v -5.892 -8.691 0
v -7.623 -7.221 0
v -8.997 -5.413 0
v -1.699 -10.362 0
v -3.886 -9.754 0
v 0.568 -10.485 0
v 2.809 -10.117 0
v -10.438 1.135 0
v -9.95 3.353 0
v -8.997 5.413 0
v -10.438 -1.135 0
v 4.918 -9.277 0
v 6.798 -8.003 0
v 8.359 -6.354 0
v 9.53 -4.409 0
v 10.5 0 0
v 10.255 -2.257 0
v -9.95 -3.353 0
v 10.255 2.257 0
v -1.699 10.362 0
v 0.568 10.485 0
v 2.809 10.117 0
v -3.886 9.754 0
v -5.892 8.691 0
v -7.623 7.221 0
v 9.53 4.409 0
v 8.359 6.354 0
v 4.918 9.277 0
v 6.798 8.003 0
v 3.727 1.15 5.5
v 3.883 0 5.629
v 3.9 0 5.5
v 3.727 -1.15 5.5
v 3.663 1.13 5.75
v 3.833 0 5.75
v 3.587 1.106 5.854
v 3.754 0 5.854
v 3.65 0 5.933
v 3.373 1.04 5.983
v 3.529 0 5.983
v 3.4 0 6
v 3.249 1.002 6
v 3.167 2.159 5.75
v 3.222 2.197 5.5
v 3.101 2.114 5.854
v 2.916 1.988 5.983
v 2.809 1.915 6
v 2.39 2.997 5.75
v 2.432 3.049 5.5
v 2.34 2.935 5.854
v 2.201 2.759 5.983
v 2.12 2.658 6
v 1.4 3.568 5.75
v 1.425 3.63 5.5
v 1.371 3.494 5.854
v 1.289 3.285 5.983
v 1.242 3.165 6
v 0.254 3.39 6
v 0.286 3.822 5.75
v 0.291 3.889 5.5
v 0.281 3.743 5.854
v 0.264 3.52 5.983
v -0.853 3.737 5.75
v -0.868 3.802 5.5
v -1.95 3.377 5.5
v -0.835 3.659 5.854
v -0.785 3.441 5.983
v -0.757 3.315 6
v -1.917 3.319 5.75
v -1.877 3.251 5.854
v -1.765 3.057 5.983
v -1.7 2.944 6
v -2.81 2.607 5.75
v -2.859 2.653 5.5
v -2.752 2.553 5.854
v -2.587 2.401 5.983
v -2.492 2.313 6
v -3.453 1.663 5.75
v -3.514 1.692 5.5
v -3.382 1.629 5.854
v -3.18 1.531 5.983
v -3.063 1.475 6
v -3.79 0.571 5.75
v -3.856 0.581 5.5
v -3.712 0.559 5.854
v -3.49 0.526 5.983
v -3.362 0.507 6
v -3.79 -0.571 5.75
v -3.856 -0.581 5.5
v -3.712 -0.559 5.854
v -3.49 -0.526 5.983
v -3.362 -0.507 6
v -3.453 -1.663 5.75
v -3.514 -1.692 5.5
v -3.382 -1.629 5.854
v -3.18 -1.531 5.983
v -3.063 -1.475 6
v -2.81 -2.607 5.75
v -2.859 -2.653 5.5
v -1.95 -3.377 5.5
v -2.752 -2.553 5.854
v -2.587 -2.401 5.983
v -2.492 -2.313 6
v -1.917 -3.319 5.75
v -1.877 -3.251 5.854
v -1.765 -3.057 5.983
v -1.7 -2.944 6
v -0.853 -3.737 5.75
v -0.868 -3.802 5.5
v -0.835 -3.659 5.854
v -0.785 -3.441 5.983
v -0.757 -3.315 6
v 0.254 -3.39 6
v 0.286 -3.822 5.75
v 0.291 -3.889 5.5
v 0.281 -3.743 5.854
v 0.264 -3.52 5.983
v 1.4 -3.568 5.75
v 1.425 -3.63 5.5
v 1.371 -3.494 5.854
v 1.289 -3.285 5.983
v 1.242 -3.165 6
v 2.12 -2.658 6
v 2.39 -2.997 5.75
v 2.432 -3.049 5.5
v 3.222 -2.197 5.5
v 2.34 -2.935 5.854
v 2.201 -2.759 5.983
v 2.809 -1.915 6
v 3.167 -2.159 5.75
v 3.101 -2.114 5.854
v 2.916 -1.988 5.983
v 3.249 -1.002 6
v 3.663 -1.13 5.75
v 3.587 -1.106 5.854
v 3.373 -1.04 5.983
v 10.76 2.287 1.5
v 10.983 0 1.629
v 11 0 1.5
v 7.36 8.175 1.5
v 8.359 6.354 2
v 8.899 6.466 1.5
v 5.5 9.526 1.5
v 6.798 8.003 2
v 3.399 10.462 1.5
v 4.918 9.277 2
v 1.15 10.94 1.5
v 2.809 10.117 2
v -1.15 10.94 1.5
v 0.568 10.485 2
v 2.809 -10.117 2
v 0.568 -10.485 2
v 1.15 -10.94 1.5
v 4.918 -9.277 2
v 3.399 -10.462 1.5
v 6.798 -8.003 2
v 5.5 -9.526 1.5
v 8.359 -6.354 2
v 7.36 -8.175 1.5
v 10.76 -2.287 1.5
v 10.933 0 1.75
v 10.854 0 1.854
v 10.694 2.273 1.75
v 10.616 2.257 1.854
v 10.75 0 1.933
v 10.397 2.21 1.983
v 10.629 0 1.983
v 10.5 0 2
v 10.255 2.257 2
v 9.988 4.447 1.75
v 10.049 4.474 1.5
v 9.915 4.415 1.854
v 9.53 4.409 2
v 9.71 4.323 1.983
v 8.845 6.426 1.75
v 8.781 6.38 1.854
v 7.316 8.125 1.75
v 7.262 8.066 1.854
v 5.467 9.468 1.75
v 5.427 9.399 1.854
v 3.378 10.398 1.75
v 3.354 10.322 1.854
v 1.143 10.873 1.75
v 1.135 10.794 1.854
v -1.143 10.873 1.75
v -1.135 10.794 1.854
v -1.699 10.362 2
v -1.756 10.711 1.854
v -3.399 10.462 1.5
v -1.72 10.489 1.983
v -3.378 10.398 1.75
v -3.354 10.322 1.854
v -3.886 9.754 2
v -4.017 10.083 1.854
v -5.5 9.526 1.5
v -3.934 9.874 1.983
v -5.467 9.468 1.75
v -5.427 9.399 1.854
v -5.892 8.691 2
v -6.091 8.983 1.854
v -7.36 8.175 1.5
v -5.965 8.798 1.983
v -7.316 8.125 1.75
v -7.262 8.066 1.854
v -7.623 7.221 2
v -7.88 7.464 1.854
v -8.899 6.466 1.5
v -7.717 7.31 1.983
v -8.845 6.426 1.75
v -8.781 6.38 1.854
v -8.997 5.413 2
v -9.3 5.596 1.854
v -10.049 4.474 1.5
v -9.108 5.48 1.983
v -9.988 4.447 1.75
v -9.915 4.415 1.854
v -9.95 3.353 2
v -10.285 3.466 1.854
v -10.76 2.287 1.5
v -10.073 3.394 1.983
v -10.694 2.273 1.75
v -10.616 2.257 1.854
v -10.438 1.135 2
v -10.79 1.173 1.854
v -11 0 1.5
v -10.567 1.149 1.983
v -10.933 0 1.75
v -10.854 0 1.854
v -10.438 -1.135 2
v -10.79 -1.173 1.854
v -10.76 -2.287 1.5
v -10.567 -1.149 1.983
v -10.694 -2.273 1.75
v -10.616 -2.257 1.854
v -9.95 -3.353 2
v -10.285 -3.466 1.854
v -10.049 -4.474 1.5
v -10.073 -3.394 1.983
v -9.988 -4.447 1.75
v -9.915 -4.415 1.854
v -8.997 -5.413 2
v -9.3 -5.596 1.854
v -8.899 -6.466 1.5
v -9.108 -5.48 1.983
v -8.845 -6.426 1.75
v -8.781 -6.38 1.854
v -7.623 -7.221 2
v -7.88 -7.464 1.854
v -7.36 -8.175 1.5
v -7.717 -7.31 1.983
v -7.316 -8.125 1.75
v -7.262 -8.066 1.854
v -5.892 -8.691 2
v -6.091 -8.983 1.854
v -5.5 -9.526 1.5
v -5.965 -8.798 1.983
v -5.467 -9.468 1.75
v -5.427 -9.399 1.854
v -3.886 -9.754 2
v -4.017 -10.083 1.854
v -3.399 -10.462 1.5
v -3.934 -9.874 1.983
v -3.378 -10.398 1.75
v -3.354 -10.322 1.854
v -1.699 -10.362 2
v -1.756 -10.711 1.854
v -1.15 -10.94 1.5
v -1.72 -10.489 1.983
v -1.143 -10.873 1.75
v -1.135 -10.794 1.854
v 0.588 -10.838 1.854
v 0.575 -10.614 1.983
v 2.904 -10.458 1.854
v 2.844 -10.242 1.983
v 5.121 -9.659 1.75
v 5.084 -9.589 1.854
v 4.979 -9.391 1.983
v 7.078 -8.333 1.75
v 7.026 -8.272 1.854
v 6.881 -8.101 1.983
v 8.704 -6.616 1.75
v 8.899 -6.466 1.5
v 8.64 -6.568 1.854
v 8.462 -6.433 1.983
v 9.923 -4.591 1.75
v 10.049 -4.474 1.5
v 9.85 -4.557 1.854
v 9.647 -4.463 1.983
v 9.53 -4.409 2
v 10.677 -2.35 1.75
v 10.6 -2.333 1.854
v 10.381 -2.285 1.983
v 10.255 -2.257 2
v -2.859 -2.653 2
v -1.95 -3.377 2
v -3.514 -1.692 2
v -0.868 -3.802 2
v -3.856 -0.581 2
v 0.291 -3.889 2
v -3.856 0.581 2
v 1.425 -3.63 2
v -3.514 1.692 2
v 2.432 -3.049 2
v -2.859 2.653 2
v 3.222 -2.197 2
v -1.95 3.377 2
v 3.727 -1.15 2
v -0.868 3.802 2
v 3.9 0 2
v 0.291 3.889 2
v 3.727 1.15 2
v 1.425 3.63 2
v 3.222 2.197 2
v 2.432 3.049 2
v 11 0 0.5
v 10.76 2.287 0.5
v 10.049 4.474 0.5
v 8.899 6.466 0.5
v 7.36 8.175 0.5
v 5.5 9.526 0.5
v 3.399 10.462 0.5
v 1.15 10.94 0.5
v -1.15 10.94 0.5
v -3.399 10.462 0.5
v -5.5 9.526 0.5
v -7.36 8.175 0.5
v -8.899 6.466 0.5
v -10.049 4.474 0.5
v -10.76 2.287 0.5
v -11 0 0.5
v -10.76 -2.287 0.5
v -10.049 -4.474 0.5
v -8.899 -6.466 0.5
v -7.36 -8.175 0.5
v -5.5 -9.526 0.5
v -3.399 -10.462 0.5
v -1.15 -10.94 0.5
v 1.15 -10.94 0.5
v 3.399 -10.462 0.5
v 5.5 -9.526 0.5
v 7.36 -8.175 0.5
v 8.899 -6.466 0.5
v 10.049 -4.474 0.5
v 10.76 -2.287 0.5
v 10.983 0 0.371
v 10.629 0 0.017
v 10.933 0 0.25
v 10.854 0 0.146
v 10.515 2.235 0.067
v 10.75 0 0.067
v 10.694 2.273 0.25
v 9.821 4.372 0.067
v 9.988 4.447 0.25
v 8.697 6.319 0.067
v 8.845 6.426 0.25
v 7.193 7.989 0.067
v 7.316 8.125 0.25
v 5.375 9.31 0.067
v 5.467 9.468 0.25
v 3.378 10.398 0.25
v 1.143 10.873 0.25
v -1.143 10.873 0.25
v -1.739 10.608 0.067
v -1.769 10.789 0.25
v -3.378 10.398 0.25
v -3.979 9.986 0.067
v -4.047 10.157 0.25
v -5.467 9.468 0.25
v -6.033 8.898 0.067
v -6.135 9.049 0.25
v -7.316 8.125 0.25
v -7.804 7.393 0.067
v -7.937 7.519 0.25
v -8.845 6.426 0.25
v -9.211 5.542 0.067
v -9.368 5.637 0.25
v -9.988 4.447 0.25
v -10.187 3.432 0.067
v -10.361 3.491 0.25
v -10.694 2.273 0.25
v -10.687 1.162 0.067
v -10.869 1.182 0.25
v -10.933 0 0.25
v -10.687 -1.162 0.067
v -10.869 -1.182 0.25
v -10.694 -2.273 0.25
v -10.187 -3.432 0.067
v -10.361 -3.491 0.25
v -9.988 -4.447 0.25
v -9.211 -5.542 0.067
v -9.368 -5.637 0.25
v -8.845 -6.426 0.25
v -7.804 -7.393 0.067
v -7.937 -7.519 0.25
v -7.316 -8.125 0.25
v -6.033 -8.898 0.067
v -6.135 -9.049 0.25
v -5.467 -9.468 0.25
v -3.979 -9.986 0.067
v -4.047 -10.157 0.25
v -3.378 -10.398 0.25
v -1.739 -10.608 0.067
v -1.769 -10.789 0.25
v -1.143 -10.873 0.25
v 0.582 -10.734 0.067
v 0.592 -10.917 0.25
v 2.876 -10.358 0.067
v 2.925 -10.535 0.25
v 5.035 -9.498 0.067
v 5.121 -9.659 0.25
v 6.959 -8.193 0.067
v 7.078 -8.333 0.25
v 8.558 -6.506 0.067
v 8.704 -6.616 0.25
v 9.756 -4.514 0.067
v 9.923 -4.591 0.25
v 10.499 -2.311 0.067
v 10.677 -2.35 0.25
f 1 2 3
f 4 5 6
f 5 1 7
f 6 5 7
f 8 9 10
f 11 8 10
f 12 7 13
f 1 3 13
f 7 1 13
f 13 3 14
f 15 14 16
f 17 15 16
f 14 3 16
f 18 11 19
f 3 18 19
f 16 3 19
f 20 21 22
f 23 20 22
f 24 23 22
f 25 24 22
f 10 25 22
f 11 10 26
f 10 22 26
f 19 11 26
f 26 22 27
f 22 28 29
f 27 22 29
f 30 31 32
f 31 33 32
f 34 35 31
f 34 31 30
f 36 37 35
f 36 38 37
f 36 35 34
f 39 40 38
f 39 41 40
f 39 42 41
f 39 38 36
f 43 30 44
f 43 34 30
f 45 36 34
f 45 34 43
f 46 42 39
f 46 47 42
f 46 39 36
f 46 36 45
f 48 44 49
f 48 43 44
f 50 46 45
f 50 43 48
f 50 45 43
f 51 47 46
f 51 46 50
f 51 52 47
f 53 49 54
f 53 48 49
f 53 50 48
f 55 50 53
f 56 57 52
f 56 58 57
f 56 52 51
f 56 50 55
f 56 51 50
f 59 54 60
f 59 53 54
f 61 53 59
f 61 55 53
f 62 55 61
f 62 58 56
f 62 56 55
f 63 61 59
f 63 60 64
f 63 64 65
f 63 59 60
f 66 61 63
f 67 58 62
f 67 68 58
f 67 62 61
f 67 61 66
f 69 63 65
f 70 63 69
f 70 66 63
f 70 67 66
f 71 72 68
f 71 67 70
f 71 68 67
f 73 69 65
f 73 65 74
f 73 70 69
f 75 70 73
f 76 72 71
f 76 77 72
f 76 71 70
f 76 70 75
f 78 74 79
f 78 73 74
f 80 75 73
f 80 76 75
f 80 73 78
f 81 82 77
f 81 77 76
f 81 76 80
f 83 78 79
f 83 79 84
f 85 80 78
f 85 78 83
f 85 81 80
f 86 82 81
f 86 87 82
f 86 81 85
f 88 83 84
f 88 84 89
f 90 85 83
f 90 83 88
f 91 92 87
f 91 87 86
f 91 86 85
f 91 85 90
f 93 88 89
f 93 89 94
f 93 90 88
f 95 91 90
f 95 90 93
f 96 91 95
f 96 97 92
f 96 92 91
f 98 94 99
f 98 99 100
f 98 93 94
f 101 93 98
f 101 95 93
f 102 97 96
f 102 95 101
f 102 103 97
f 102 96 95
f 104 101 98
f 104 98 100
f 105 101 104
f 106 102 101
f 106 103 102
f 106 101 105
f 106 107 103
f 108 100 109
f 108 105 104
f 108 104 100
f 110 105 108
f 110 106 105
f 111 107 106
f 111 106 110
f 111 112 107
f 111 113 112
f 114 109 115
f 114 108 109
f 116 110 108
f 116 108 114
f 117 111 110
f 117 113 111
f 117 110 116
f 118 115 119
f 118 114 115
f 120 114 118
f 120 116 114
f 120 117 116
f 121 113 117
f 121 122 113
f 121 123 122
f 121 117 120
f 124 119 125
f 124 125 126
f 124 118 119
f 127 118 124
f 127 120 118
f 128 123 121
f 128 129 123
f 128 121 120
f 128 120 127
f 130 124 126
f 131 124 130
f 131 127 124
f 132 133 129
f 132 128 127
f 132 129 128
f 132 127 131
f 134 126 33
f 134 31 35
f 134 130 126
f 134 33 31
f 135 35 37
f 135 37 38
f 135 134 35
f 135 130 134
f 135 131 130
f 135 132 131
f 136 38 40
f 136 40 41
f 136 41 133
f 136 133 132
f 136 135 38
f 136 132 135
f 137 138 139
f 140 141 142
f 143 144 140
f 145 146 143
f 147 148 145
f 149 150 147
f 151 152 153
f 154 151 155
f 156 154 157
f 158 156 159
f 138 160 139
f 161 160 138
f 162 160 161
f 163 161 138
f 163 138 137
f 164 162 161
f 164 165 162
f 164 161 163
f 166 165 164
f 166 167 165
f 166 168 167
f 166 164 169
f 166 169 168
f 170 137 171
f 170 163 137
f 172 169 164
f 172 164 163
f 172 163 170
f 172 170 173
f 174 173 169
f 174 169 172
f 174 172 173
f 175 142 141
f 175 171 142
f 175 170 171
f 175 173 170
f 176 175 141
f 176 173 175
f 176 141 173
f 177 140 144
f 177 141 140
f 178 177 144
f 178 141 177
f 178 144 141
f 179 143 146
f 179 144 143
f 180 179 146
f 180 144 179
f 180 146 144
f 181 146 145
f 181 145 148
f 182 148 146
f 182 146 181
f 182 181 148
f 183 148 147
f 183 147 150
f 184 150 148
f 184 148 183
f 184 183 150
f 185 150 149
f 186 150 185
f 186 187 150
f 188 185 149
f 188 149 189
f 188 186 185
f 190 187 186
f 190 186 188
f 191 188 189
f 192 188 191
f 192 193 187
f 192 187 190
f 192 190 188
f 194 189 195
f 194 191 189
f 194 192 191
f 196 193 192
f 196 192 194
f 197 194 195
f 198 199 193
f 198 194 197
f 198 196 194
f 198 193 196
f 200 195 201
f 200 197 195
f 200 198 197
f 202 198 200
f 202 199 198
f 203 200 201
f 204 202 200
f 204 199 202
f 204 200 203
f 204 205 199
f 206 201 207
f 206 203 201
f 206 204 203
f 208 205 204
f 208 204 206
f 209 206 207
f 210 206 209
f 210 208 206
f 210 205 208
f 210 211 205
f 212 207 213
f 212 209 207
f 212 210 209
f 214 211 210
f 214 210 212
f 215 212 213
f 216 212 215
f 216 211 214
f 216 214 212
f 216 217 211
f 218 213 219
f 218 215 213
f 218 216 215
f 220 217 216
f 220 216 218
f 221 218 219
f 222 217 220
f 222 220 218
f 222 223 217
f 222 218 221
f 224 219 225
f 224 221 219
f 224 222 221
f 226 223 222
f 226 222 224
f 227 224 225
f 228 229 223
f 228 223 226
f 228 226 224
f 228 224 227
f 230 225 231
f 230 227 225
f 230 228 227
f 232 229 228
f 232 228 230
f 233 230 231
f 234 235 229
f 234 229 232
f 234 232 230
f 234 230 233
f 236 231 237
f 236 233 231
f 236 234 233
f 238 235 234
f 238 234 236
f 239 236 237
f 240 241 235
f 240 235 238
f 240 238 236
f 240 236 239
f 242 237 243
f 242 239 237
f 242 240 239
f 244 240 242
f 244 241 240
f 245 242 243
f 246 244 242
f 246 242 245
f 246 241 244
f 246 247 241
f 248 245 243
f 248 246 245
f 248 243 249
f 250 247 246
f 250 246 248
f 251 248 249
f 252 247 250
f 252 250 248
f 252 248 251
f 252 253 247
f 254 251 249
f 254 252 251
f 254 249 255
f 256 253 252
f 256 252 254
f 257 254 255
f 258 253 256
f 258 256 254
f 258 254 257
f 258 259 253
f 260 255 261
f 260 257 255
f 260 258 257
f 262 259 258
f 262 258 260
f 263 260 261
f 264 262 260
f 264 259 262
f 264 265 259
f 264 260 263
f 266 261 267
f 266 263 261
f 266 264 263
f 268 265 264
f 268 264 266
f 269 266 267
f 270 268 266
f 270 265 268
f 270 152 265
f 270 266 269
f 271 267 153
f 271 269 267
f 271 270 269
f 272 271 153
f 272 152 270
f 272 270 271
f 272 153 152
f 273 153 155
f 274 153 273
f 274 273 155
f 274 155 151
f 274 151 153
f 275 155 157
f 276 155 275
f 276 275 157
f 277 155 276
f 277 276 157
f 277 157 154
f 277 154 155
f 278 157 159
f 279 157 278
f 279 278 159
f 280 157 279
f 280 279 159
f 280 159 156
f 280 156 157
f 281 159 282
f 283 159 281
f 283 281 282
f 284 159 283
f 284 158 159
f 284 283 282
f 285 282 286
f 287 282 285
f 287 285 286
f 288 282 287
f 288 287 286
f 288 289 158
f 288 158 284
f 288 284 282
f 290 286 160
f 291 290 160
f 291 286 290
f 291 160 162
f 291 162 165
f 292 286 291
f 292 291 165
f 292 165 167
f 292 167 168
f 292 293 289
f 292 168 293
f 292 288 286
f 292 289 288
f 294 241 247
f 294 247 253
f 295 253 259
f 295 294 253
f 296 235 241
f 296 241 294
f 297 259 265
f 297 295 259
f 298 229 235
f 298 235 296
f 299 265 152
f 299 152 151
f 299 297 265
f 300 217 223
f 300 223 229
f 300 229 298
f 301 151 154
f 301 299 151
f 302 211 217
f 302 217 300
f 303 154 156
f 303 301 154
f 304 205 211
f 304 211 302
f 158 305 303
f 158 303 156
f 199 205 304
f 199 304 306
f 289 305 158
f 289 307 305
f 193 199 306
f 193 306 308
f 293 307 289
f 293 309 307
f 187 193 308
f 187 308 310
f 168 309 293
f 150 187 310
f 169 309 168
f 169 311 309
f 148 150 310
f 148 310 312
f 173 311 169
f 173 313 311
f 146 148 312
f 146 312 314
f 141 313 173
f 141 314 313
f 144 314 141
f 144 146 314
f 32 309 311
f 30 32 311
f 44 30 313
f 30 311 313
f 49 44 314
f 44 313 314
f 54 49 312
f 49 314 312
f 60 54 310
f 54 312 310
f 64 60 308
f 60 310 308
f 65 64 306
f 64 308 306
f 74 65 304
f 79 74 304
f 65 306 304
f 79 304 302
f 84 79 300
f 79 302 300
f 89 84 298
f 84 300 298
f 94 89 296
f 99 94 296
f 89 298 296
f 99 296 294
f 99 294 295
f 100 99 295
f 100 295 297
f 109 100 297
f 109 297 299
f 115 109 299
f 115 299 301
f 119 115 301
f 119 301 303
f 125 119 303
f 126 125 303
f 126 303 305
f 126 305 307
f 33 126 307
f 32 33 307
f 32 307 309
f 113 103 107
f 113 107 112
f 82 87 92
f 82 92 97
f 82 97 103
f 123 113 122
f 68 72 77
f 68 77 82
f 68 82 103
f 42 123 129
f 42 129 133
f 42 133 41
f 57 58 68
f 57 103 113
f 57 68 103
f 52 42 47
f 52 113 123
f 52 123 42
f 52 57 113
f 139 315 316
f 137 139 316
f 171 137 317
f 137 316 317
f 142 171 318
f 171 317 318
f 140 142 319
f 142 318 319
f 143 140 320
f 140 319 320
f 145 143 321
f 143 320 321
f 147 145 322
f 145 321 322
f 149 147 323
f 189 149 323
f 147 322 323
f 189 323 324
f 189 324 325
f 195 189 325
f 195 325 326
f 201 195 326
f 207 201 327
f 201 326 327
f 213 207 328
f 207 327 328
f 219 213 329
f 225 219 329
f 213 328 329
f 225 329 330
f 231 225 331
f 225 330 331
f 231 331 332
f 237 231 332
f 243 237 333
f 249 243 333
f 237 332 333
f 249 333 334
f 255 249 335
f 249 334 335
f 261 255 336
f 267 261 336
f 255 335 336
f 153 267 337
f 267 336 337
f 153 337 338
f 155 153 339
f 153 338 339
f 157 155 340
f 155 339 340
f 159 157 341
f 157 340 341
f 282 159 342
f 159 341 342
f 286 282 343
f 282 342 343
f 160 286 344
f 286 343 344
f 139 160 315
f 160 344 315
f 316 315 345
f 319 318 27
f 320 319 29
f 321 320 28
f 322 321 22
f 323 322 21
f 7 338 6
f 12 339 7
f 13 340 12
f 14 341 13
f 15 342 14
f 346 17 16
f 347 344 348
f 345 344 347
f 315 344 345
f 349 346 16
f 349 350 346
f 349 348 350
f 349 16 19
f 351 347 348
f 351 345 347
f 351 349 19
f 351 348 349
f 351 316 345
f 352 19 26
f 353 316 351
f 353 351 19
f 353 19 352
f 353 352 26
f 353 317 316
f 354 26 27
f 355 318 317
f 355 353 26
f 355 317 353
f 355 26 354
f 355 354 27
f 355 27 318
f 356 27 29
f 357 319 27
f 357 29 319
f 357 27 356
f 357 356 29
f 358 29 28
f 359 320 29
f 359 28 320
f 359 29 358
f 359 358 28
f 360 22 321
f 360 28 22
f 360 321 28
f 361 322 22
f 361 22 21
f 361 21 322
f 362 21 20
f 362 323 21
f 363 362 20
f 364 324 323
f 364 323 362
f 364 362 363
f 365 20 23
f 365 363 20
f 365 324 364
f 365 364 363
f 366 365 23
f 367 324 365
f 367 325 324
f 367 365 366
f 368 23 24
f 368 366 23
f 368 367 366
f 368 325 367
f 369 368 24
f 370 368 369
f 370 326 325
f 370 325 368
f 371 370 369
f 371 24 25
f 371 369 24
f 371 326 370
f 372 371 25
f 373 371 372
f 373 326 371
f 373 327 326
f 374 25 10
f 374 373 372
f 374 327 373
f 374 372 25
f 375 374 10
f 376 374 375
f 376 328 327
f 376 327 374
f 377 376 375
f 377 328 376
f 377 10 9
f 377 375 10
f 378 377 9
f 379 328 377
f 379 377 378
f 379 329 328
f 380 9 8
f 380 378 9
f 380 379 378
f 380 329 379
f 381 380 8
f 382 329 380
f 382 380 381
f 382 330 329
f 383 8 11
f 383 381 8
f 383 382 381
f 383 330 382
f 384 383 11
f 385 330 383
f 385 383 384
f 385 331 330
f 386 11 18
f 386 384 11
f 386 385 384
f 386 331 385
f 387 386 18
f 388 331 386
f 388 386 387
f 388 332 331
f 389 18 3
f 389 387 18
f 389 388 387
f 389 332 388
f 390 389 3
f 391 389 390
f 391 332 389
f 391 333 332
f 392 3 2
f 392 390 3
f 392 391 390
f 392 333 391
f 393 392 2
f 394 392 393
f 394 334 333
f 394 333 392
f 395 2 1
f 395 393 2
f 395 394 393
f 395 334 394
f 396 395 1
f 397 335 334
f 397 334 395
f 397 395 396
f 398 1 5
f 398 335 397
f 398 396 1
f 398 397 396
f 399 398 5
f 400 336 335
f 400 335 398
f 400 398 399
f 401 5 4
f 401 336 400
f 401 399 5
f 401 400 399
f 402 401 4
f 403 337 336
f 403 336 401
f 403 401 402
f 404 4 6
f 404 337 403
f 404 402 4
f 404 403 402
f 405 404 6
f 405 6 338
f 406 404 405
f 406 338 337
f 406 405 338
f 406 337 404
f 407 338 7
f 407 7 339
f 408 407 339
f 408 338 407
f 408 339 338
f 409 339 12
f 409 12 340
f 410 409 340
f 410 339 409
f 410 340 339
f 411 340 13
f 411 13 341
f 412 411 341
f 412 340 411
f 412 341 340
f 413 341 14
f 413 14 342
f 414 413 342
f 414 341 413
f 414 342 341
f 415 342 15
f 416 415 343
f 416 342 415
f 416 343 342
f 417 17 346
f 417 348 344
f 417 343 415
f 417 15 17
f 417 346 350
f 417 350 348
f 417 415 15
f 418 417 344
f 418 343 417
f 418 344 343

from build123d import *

# Parameters (mm, degrees)
F0_R     = 11
F1_DEPTH = 2
F2_R     = 3.9
F3_DEPTH = 6
F4_R     = 0.5


# Not quite as in the source:
# - a feature names something its author has since deleted; it is built from what else it names


with BuildPart() as f1:
    # F0 (on Top) → F1 (new body)
    with BuildSketch(Plane.XY):
        Circle(F0_R)
    extrude(amount=F1_DEPTH)

    # F2 (on Top) → F3 (join)
    with BuildSketch(Plane.XY):
        Circle(F2_R)
    extrude(amount=F3_DEPTH)

    # F4
    f4_edges = [f1.edges().sort_by_distance(p)[0] for p in [
        (-11, 0, 2),
        (-11, 0, 0),
        (-3.9, 0, 6),
    ]]
    fillet(f4_edges, radius=F4_R)


solid = f1.part
